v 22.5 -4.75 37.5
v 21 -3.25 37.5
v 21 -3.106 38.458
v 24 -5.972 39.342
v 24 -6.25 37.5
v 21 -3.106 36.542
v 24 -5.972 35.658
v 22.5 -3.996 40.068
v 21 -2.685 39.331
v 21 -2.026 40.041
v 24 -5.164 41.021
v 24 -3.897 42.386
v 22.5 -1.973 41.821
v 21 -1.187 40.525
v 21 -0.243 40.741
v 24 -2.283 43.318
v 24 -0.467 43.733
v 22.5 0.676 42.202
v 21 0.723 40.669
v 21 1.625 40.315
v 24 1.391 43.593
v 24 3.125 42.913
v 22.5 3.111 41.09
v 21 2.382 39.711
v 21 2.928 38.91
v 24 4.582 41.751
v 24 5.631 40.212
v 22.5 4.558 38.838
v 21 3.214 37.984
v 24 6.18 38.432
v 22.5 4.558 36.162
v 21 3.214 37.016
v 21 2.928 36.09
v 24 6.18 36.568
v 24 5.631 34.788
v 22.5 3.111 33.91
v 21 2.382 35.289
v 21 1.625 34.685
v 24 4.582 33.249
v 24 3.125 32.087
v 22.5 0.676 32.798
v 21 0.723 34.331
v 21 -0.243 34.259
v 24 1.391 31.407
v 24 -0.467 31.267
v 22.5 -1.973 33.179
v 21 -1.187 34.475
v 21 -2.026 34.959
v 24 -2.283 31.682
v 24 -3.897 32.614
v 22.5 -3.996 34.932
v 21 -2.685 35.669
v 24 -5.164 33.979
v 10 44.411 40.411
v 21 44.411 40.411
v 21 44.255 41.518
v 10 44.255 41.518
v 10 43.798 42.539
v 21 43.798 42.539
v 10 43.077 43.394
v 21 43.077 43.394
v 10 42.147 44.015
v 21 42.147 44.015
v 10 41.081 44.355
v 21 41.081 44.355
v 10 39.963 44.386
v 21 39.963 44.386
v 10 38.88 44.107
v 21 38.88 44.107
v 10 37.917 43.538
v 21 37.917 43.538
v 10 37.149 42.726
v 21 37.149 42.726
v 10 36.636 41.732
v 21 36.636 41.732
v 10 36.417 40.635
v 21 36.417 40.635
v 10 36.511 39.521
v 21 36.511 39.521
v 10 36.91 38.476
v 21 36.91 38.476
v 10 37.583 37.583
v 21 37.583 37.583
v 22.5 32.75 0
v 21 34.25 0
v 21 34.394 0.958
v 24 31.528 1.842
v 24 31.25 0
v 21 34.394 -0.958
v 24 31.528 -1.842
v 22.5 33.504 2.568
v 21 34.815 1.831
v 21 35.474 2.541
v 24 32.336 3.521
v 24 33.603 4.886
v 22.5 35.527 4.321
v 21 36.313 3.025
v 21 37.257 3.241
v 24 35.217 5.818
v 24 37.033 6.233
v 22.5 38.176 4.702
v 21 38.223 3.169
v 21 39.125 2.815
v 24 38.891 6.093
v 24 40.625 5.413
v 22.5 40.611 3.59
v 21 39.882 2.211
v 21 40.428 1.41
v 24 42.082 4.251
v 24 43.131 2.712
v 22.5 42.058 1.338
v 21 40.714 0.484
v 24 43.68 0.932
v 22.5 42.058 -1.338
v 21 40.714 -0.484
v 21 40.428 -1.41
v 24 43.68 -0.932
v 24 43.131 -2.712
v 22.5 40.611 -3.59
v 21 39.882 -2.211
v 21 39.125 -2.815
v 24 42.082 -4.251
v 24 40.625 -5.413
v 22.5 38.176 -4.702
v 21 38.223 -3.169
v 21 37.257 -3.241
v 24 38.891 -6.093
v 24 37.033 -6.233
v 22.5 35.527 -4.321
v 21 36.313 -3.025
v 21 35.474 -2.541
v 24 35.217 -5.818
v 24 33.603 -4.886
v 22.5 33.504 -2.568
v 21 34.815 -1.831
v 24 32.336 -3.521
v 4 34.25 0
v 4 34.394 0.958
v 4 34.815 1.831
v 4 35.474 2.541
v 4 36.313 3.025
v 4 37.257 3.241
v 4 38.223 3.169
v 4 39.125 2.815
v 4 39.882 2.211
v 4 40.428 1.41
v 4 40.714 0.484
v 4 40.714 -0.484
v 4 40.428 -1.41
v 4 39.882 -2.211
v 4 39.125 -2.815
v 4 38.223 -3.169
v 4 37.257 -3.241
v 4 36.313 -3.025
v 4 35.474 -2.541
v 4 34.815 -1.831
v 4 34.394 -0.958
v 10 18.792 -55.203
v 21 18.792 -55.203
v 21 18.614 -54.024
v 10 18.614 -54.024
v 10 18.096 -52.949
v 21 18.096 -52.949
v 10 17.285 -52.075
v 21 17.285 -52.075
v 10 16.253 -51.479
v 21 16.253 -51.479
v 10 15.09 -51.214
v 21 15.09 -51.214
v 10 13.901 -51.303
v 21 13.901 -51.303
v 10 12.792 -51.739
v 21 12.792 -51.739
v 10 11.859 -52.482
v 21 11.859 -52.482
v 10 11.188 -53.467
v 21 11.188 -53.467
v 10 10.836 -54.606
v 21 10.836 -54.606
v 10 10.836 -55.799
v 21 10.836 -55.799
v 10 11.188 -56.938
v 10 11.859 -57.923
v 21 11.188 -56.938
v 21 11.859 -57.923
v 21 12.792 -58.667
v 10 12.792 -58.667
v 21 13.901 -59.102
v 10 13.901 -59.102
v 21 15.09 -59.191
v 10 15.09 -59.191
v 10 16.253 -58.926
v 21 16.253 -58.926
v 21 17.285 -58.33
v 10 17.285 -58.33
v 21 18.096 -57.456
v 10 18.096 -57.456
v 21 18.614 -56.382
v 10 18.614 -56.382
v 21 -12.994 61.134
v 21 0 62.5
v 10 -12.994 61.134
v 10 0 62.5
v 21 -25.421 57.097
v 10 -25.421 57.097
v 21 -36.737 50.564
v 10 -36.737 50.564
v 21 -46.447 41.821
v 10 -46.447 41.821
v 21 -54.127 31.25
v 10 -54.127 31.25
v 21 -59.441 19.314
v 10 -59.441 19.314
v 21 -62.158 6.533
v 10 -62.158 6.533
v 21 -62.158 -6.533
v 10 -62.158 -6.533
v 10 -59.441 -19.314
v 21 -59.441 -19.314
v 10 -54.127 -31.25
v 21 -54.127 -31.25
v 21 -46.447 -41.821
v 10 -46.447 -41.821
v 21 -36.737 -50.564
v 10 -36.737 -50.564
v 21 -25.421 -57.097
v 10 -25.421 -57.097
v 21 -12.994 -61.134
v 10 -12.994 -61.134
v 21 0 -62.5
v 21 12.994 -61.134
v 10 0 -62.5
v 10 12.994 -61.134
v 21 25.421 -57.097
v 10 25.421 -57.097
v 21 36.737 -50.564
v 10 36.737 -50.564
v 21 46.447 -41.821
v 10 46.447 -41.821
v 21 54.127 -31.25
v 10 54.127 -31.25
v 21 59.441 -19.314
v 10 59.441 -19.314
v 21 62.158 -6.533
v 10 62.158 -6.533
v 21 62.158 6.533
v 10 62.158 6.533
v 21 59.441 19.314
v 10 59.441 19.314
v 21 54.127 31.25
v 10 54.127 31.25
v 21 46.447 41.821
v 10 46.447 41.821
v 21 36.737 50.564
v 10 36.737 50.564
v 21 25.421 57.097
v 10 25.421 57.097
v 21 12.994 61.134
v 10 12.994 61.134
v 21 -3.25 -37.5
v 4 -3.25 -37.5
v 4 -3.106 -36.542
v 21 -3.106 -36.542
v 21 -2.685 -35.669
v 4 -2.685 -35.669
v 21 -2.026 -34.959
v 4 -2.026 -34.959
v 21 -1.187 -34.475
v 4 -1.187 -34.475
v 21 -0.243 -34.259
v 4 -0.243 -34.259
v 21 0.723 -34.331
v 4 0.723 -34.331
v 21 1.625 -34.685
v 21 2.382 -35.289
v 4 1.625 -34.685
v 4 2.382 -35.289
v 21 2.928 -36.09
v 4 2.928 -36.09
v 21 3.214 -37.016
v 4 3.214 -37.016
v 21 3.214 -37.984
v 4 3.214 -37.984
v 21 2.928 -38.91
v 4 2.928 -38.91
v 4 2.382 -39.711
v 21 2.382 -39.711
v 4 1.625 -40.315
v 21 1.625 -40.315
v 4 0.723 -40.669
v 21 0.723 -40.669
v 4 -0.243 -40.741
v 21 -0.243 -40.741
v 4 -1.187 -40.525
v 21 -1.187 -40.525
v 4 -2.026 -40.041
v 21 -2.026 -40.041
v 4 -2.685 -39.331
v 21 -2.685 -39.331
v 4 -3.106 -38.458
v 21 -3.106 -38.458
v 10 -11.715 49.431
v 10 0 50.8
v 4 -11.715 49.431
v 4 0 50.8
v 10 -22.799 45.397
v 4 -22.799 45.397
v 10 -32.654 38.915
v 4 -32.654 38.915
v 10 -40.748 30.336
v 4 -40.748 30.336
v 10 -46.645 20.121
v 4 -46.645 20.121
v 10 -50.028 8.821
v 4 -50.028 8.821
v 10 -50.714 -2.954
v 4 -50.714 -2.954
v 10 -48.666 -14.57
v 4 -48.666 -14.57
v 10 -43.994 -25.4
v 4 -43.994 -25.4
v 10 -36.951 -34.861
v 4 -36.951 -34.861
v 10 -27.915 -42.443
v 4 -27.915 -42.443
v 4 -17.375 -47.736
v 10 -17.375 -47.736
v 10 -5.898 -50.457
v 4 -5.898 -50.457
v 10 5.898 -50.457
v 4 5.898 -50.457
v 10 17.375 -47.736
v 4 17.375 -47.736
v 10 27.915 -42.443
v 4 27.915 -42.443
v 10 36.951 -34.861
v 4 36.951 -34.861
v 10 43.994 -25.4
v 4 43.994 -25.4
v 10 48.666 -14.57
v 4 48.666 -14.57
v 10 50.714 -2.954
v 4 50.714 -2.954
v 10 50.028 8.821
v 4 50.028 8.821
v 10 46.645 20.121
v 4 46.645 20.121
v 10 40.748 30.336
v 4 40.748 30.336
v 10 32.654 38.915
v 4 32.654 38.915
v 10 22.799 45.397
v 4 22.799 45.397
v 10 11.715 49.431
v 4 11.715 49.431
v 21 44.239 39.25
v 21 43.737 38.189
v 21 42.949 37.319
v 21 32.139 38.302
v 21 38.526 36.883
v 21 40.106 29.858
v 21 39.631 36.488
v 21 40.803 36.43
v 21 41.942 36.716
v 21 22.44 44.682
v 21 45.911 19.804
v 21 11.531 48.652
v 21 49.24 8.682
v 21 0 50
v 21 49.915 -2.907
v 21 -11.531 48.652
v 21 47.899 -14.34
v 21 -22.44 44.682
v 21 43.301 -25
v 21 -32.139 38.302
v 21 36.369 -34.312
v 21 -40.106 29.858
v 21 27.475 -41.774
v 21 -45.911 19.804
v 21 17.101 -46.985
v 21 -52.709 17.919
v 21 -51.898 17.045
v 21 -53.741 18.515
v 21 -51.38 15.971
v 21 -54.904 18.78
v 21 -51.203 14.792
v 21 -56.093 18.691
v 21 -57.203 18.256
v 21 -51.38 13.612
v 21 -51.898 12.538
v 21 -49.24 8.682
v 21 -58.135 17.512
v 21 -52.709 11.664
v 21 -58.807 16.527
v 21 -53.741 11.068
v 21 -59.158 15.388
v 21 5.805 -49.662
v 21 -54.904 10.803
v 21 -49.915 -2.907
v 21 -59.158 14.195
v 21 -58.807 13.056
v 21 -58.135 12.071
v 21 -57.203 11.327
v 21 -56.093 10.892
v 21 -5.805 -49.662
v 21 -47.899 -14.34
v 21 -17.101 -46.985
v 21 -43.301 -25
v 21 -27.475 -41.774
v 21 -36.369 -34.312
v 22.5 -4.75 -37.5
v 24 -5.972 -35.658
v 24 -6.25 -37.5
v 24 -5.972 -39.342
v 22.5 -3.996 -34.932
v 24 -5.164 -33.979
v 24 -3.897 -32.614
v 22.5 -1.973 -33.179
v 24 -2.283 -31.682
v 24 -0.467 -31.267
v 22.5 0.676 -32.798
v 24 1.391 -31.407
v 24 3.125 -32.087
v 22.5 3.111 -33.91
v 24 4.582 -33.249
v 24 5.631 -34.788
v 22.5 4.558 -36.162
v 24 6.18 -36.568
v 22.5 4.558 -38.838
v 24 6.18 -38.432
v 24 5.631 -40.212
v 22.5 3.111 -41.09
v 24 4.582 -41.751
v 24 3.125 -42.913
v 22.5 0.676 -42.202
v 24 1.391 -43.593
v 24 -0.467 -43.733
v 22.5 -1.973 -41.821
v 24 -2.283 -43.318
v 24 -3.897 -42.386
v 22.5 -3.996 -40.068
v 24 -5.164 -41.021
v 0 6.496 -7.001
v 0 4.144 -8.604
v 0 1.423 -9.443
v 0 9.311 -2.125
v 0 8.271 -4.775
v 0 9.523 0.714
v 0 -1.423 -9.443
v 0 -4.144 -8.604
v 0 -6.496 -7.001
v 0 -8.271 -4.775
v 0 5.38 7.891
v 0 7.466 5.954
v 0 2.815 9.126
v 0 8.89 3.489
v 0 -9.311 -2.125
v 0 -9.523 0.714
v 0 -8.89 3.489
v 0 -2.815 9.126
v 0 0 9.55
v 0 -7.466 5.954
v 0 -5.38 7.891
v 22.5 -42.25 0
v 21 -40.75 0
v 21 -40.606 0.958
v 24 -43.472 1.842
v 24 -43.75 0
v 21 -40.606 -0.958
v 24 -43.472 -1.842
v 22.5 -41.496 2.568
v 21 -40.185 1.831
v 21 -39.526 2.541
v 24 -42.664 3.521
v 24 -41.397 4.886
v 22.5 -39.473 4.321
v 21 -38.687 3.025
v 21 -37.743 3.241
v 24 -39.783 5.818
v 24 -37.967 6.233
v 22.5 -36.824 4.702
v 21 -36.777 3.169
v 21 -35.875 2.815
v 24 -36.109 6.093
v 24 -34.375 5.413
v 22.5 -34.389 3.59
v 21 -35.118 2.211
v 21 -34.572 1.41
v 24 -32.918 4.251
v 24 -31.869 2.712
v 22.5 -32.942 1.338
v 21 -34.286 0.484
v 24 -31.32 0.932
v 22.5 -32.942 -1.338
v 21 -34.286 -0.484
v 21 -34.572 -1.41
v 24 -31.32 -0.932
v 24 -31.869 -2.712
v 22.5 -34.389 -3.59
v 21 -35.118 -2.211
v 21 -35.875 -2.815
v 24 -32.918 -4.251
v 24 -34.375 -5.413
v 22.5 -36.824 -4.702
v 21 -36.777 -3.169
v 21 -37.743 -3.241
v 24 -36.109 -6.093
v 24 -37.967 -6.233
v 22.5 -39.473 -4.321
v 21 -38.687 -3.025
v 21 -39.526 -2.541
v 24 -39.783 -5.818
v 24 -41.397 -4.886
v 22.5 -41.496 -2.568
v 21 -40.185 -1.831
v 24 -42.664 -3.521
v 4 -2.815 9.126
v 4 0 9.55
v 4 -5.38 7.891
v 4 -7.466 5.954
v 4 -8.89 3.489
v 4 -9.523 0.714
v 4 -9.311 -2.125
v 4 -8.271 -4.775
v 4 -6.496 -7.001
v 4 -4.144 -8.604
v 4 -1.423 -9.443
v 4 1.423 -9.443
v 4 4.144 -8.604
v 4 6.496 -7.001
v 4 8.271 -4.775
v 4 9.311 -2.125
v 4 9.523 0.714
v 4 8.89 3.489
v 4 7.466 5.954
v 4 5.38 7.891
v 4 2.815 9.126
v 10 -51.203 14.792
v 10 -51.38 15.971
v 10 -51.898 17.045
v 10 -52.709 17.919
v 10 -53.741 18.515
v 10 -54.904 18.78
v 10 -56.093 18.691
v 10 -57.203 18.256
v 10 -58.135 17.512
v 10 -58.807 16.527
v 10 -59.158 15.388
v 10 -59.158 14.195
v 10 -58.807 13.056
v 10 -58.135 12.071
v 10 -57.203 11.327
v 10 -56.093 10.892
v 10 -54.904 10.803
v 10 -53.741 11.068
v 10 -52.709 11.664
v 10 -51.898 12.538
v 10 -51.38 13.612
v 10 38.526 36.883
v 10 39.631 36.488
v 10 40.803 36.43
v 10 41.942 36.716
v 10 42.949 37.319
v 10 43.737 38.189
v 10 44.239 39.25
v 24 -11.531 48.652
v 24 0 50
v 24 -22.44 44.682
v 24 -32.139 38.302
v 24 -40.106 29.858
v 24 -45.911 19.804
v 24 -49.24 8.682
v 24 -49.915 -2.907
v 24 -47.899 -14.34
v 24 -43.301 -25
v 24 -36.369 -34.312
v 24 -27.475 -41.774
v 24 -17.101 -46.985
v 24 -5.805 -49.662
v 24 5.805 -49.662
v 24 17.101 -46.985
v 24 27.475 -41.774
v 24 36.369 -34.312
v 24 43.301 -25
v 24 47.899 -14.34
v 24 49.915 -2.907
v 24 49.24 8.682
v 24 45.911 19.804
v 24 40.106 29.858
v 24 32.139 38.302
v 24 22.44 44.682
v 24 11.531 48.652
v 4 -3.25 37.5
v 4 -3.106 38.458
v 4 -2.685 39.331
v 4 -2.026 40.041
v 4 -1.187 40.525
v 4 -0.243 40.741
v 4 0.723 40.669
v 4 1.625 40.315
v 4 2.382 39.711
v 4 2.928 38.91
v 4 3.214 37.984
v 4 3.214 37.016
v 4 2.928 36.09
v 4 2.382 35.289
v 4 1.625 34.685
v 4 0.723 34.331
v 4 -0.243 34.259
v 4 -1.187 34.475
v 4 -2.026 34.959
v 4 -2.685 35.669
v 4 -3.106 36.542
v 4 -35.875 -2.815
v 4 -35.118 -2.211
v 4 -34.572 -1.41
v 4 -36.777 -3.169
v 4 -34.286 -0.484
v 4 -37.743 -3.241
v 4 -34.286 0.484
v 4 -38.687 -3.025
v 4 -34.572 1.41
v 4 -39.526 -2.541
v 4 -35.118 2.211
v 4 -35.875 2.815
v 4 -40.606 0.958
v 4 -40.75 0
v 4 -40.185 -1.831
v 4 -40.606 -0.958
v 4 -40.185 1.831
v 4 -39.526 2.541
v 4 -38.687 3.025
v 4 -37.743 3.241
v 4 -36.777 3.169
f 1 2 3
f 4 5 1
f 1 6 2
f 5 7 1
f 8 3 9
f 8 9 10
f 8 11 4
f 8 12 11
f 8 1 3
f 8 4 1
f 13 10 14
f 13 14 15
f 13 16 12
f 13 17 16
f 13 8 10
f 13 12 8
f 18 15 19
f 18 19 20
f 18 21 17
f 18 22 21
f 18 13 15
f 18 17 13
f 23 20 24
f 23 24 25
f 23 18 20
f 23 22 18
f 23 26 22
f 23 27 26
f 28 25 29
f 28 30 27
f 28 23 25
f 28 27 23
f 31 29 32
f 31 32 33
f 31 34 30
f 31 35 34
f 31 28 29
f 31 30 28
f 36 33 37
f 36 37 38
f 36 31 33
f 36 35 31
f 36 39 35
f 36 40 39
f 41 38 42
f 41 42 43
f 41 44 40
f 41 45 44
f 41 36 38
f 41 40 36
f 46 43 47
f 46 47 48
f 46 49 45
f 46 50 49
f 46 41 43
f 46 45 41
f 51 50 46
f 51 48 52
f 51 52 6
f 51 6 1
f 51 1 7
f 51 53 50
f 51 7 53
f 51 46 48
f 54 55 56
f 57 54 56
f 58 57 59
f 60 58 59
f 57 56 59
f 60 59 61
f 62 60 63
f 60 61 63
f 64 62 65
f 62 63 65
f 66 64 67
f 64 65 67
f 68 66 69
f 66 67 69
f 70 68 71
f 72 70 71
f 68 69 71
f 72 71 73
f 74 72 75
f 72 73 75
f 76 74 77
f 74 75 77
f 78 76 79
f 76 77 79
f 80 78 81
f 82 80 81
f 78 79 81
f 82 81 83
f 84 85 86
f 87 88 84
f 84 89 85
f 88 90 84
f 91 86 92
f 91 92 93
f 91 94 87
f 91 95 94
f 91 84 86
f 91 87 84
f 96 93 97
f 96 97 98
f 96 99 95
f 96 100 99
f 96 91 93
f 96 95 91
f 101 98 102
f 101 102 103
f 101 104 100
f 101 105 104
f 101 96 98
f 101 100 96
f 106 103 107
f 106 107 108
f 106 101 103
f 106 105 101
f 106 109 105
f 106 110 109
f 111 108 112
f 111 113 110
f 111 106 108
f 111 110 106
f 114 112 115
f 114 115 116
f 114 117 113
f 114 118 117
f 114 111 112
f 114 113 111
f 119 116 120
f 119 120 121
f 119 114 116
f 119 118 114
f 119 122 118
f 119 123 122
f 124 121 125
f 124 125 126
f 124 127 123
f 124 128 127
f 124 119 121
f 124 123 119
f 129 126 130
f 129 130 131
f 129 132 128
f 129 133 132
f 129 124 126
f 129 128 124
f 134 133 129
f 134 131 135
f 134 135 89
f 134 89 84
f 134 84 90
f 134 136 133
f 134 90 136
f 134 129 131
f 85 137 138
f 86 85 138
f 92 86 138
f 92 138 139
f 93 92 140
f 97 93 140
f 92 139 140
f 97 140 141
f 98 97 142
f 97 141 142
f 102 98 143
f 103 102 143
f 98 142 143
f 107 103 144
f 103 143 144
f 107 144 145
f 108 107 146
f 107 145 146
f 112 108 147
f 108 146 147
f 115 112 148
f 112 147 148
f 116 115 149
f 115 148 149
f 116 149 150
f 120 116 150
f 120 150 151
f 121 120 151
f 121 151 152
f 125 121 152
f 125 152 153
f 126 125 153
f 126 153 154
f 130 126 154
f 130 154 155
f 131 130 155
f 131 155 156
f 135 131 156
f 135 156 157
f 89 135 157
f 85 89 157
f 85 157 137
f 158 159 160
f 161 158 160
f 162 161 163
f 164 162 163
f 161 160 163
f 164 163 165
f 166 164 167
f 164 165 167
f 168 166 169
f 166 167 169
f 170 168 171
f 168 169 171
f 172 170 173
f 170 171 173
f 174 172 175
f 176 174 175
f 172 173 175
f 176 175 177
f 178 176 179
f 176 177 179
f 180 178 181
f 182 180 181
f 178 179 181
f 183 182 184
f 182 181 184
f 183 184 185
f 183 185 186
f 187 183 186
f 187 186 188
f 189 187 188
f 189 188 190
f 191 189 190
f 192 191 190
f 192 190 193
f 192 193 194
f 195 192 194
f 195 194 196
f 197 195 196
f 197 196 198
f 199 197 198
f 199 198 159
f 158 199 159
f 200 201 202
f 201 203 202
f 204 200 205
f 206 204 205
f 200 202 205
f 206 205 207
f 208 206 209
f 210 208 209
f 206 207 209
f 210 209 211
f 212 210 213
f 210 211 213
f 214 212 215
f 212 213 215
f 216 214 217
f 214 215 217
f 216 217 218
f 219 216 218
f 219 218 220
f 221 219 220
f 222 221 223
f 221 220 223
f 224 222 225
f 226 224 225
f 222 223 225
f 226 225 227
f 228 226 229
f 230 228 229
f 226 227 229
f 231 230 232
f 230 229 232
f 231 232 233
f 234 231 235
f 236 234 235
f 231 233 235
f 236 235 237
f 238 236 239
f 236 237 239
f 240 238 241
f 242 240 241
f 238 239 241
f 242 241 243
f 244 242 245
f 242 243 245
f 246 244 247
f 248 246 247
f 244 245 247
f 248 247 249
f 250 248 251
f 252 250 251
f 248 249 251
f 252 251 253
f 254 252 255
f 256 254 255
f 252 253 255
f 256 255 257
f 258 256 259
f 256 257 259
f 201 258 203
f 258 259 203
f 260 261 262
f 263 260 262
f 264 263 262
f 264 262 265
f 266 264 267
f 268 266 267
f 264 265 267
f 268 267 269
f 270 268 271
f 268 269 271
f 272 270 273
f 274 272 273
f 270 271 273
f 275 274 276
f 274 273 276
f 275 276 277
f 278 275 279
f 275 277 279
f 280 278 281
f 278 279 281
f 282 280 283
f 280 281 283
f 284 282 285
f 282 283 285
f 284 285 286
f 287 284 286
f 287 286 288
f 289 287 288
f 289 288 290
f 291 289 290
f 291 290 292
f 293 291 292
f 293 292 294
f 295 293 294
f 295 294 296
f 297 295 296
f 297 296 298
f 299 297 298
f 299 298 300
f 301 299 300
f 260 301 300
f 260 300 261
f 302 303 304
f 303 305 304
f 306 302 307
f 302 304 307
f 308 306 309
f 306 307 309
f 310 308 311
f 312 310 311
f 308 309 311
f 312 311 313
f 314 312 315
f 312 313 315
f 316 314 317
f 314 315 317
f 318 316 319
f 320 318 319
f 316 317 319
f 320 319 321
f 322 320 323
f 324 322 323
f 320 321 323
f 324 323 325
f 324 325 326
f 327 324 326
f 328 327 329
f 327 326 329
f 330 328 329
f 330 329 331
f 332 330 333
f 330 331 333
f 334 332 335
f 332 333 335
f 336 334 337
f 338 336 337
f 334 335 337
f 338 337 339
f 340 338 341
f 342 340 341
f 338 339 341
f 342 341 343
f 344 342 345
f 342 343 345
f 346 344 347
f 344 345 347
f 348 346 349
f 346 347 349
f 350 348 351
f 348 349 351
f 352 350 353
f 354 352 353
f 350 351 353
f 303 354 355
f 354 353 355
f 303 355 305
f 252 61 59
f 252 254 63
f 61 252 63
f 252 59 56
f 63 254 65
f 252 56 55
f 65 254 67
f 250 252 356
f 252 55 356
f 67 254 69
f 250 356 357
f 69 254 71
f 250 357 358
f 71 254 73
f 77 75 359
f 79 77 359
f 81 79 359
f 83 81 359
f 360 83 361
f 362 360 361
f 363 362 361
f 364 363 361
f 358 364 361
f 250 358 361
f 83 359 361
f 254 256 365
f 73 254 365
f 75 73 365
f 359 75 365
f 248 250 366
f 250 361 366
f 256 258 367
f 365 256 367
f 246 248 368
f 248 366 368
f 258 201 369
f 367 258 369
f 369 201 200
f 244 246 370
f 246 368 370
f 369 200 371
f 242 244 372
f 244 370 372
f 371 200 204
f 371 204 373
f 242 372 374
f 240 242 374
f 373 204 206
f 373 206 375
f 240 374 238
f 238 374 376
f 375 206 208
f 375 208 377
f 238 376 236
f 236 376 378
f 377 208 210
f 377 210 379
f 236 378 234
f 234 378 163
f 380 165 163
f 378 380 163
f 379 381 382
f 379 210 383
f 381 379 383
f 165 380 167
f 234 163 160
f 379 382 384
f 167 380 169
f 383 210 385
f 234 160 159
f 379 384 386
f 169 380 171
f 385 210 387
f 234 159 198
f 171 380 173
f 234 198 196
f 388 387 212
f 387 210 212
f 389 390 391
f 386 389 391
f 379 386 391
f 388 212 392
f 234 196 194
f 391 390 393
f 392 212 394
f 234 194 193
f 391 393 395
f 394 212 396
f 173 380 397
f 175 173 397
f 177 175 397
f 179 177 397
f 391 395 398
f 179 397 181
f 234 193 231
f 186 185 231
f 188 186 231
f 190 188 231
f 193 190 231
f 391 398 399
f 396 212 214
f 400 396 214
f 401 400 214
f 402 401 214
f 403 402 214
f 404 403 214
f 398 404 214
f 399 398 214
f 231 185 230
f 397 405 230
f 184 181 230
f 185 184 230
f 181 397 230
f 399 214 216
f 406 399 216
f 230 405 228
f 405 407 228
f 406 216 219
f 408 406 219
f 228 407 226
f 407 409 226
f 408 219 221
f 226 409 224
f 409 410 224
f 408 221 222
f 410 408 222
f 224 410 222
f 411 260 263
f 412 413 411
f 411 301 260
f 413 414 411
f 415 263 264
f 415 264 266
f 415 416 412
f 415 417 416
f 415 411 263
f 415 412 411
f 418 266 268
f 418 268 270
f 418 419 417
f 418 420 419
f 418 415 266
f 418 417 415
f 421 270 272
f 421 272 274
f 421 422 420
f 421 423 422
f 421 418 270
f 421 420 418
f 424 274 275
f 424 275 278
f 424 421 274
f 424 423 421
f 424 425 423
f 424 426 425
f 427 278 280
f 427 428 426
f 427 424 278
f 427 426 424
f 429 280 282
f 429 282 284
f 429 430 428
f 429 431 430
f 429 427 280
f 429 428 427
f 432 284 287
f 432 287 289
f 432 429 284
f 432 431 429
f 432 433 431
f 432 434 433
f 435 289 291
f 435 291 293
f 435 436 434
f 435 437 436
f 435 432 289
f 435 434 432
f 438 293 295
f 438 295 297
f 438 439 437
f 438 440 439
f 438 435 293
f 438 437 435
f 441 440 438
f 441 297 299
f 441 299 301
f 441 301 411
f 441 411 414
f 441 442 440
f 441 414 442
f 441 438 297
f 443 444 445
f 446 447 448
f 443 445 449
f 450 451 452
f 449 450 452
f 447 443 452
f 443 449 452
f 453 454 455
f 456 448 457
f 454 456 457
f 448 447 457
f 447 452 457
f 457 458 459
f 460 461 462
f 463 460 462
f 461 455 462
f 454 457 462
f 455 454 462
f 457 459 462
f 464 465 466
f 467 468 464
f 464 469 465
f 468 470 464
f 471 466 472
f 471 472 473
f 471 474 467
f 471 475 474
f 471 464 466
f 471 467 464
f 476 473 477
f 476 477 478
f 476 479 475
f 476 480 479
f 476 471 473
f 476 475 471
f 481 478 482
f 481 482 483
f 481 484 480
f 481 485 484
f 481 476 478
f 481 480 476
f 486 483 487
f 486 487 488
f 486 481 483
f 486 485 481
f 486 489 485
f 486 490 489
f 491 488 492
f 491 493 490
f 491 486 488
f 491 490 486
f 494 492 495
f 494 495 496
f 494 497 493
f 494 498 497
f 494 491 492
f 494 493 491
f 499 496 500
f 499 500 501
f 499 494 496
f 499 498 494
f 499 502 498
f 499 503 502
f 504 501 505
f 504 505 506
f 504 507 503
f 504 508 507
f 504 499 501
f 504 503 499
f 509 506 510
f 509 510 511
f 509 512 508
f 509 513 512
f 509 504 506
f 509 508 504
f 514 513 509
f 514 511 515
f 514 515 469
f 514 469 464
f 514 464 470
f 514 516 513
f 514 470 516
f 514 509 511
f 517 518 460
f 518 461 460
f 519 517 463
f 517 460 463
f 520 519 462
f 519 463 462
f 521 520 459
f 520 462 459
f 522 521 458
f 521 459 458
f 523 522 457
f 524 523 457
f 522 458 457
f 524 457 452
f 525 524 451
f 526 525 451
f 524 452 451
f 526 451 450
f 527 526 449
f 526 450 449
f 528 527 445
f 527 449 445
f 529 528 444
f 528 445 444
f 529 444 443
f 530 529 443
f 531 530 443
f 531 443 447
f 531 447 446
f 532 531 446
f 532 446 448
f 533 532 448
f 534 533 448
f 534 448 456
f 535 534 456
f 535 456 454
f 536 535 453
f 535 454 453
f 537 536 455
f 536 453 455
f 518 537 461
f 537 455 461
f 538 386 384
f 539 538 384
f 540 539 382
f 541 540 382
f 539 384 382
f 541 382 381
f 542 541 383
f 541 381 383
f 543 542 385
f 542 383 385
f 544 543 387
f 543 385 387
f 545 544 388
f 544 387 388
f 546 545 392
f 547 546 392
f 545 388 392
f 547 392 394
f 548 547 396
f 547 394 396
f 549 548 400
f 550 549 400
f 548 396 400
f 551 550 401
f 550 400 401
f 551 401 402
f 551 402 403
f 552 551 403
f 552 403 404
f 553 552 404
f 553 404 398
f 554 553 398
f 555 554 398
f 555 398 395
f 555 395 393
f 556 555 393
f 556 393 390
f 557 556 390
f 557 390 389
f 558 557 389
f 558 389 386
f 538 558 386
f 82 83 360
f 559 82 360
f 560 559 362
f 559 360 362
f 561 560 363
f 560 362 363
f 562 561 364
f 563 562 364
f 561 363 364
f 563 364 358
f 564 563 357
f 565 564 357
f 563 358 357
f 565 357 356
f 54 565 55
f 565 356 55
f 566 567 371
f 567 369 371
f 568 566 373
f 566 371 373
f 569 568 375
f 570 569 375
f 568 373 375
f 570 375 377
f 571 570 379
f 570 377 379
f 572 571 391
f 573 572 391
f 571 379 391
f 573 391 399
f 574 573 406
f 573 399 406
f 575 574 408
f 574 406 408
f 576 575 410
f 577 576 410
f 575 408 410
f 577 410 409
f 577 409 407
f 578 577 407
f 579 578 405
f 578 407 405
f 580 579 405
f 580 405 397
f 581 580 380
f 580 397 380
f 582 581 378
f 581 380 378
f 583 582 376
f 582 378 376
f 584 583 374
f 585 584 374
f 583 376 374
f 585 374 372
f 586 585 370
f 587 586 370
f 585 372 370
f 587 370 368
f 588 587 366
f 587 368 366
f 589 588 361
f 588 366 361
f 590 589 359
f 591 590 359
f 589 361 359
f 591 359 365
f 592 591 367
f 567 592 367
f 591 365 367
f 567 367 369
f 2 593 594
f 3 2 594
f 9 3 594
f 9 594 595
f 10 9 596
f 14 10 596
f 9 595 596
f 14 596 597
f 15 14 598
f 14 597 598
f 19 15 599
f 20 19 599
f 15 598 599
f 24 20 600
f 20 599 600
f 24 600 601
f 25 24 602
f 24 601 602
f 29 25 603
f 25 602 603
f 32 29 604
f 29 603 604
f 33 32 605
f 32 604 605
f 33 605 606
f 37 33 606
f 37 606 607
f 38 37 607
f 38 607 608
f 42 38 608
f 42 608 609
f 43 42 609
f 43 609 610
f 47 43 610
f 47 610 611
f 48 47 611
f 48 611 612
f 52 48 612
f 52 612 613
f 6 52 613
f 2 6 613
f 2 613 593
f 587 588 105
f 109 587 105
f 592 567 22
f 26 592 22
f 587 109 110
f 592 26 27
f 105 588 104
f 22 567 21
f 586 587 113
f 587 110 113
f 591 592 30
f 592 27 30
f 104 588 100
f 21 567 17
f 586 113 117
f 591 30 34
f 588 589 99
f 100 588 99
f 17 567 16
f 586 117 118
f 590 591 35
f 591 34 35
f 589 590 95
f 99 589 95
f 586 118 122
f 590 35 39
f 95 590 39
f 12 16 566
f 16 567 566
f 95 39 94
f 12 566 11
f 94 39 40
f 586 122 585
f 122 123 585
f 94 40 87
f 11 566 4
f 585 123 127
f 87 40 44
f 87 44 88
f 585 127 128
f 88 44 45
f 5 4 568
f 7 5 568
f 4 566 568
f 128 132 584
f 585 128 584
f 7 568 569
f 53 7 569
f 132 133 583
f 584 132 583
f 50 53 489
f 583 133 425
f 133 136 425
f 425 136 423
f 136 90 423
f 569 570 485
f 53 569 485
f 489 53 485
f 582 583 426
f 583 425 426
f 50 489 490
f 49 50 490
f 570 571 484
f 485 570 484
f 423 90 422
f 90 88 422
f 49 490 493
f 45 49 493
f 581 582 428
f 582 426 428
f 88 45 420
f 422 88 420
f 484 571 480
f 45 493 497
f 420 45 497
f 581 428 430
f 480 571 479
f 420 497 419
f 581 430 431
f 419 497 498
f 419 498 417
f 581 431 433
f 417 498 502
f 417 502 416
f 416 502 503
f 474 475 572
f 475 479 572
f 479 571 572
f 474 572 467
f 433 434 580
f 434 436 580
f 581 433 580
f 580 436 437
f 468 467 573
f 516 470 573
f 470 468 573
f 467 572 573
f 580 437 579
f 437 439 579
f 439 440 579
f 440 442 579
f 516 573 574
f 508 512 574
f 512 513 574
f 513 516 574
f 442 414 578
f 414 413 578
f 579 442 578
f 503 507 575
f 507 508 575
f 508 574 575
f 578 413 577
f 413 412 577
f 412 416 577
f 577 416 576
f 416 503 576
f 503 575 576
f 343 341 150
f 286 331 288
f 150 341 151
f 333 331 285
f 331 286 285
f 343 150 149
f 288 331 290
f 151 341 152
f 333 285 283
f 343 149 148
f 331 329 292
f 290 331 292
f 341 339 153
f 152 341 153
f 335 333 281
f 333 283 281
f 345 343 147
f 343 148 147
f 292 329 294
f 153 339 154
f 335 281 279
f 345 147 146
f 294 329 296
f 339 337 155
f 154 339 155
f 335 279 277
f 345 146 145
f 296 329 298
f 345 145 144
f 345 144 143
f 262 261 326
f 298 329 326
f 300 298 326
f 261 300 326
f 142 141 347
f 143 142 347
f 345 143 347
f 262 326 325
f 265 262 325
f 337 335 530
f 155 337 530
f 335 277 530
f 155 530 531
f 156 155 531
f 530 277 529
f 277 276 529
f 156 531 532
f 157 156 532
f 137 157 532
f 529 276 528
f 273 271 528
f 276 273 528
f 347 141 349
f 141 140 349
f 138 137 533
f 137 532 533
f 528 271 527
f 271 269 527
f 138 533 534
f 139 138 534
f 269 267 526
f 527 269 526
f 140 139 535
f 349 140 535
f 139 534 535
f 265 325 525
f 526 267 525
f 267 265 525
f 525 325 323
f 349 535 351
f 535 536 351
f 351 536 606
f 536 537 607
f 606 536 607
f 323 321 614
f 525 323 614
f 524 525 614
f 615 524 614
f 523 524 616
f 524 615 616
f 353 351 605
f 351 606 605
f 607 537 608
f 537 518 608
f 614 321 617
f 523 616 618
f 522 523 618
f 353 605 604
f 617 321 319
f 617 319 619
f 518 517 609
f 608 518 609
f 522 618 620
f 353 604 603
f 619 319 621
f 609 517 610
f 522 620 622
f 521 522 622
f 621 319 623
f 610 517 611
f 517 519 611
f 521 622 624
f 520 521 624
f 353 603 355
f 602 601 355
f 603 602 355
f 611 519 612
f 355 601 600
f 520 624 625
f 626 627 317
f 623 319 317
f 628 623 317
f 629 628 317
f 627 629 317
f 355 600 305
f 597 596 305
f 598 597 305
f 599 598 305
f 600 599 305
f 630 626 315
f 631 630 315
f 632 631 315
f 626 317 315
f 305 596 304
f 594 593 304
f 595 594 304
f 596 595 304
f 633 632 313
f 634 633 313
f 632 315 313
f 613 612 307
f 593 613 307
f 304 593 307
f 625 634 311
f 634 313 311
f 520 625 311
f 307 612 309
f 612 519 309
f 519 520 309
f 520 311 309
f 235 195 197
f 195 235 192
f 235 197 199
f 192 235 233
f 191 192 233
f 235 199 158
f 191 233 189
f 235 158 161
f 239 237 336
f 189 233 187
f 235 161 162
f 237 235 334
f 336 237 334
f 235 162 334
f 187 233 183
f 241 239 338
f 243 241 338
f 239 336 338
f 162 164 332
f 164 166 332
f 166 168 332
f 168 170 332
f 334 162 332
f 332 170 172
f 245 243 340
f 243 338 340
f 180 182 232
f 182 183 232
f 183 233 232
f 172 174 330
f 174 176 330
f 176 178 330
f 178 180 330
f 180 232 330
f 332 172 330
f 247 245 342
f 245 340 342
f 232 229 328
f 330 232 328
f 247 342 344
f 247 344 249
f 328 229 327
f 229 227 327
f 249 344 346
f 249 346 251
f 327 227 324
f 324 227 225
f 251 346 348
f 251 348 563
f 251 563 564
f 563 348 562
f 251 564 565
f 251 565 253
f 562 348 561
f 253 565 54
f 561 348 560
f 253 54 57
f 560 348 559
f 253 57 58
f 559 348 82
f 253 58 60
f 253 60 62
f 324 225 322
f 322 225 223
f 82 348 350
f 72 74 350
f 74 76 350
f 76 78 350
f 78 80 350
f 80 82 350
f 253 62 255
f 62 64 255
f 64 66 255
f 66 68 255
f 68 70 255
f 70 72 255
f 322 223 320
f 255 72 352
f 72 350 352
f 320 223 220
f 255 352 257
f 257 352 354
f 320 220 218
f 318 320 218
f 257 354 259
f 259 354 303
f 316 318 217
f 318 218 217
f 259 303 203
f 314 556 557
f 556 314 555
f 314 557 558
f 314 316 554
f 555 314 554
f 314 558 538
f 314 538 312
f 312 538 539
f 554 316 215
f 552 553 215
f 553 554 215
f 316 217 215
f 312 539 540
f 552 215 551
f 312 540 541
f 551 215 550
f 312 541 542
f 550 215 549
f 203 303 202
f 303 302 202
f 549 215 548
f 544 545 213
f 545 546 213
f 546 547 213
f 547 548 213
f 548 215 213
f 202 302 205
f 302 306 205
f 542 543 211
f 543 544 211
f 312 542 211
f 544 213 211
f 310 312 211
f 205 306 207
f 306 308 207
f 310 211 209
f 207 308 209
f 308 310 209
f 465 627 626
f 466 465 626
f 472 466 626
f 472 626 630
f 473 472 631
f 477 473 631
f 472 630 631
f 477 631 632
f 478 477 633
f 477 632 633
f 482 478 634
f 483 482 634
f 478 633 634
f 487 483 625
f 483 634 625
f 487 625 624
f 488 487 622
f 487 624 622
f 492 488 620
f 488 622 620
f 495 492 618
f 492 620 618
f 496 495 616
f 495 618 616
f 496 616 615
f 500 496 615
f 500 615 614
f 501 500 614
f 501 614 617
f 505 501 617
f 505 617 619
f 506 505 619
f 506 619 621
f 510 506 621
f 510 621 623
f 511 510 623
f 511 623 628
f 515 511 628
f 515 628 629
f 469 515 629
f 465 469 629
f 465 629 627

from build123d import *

# Parameters (mm, degrees)
F2_R     = 4
F3_DEPTH = 25
F4_R     = 3.25
F5_DEPTH = 25
F6_SIZE  = 3


# Not quite as in the source:
# - a feature names something its author has since deleted; it is built from what else it names


with BuildPart() as f1:
    # F0 (on Front) → F1 (revolve)
    with BuildSketch(Plane.XZ):
        Polygon((0, 9.55), (0, 0), (17.623, 0), (24, 0), (24, 50), (21, 50), (21, 62.5), (10, 62.5), (10, 50.8), (4, 50.8), (4, 9.55), align=None)
    revolve(axis=Axis((8.8115, 0, 0), (1, 0, 0)))

    # F2 (on face) → F3 (cut)
    with BuildSketch(Plane.YZ.offset(21)):
        with BuildLine():
            ThreePointArc((44.4111525448, 40.4111525448), (38.8804188154, 44.1066706749), (37.5827254201, 37.5827254201))
            ThreePointArc((37.5827254201, 37.5827254201), (41.9418862743, 36.7156344148), (44.4111525448, 40.4111525448))
        make_face()
        with Locations((-55.2026609724, 14.7915084276)):
            Circle(F2_R)
        with Locations((14.7915084276, -55.2026609724)):
            Circle(F2_R)
    extrude(amount=-F3_DEPTH, mode=Mode.SUBTRACT)

    # F4 (on face) → F5 (cut)
    with BuildSketch(Plane(origin=(4, 0, 0), x_dir=(0, -1, 0), z_dir=(-1, 0, 0))):
        with Locations((0, 37.5)):
            Circle(F4_R)
        with Locations((-37.5, 0)):
            Circle(F4_R)
        with Locations((0, -37.5)):
            Circle(F4_R)
        with Locations((37.5, 0)):
            Circle(F4_R)
    extrude(amount=-F5_DEPTH, mode=Mode.SUBTRACT)

    # F6
    f6_edges = [f1.edges().sort_by_distance(p)[0] for p in [
        (24, -34.25, 0),
        (24, 3.25, 37.5),
        (24, 40.75, 0),
        (24, 3.25, -37.5),
    ]]
    chamfer(f6_edges, length=F6_SIZE)


solid = f1.part
